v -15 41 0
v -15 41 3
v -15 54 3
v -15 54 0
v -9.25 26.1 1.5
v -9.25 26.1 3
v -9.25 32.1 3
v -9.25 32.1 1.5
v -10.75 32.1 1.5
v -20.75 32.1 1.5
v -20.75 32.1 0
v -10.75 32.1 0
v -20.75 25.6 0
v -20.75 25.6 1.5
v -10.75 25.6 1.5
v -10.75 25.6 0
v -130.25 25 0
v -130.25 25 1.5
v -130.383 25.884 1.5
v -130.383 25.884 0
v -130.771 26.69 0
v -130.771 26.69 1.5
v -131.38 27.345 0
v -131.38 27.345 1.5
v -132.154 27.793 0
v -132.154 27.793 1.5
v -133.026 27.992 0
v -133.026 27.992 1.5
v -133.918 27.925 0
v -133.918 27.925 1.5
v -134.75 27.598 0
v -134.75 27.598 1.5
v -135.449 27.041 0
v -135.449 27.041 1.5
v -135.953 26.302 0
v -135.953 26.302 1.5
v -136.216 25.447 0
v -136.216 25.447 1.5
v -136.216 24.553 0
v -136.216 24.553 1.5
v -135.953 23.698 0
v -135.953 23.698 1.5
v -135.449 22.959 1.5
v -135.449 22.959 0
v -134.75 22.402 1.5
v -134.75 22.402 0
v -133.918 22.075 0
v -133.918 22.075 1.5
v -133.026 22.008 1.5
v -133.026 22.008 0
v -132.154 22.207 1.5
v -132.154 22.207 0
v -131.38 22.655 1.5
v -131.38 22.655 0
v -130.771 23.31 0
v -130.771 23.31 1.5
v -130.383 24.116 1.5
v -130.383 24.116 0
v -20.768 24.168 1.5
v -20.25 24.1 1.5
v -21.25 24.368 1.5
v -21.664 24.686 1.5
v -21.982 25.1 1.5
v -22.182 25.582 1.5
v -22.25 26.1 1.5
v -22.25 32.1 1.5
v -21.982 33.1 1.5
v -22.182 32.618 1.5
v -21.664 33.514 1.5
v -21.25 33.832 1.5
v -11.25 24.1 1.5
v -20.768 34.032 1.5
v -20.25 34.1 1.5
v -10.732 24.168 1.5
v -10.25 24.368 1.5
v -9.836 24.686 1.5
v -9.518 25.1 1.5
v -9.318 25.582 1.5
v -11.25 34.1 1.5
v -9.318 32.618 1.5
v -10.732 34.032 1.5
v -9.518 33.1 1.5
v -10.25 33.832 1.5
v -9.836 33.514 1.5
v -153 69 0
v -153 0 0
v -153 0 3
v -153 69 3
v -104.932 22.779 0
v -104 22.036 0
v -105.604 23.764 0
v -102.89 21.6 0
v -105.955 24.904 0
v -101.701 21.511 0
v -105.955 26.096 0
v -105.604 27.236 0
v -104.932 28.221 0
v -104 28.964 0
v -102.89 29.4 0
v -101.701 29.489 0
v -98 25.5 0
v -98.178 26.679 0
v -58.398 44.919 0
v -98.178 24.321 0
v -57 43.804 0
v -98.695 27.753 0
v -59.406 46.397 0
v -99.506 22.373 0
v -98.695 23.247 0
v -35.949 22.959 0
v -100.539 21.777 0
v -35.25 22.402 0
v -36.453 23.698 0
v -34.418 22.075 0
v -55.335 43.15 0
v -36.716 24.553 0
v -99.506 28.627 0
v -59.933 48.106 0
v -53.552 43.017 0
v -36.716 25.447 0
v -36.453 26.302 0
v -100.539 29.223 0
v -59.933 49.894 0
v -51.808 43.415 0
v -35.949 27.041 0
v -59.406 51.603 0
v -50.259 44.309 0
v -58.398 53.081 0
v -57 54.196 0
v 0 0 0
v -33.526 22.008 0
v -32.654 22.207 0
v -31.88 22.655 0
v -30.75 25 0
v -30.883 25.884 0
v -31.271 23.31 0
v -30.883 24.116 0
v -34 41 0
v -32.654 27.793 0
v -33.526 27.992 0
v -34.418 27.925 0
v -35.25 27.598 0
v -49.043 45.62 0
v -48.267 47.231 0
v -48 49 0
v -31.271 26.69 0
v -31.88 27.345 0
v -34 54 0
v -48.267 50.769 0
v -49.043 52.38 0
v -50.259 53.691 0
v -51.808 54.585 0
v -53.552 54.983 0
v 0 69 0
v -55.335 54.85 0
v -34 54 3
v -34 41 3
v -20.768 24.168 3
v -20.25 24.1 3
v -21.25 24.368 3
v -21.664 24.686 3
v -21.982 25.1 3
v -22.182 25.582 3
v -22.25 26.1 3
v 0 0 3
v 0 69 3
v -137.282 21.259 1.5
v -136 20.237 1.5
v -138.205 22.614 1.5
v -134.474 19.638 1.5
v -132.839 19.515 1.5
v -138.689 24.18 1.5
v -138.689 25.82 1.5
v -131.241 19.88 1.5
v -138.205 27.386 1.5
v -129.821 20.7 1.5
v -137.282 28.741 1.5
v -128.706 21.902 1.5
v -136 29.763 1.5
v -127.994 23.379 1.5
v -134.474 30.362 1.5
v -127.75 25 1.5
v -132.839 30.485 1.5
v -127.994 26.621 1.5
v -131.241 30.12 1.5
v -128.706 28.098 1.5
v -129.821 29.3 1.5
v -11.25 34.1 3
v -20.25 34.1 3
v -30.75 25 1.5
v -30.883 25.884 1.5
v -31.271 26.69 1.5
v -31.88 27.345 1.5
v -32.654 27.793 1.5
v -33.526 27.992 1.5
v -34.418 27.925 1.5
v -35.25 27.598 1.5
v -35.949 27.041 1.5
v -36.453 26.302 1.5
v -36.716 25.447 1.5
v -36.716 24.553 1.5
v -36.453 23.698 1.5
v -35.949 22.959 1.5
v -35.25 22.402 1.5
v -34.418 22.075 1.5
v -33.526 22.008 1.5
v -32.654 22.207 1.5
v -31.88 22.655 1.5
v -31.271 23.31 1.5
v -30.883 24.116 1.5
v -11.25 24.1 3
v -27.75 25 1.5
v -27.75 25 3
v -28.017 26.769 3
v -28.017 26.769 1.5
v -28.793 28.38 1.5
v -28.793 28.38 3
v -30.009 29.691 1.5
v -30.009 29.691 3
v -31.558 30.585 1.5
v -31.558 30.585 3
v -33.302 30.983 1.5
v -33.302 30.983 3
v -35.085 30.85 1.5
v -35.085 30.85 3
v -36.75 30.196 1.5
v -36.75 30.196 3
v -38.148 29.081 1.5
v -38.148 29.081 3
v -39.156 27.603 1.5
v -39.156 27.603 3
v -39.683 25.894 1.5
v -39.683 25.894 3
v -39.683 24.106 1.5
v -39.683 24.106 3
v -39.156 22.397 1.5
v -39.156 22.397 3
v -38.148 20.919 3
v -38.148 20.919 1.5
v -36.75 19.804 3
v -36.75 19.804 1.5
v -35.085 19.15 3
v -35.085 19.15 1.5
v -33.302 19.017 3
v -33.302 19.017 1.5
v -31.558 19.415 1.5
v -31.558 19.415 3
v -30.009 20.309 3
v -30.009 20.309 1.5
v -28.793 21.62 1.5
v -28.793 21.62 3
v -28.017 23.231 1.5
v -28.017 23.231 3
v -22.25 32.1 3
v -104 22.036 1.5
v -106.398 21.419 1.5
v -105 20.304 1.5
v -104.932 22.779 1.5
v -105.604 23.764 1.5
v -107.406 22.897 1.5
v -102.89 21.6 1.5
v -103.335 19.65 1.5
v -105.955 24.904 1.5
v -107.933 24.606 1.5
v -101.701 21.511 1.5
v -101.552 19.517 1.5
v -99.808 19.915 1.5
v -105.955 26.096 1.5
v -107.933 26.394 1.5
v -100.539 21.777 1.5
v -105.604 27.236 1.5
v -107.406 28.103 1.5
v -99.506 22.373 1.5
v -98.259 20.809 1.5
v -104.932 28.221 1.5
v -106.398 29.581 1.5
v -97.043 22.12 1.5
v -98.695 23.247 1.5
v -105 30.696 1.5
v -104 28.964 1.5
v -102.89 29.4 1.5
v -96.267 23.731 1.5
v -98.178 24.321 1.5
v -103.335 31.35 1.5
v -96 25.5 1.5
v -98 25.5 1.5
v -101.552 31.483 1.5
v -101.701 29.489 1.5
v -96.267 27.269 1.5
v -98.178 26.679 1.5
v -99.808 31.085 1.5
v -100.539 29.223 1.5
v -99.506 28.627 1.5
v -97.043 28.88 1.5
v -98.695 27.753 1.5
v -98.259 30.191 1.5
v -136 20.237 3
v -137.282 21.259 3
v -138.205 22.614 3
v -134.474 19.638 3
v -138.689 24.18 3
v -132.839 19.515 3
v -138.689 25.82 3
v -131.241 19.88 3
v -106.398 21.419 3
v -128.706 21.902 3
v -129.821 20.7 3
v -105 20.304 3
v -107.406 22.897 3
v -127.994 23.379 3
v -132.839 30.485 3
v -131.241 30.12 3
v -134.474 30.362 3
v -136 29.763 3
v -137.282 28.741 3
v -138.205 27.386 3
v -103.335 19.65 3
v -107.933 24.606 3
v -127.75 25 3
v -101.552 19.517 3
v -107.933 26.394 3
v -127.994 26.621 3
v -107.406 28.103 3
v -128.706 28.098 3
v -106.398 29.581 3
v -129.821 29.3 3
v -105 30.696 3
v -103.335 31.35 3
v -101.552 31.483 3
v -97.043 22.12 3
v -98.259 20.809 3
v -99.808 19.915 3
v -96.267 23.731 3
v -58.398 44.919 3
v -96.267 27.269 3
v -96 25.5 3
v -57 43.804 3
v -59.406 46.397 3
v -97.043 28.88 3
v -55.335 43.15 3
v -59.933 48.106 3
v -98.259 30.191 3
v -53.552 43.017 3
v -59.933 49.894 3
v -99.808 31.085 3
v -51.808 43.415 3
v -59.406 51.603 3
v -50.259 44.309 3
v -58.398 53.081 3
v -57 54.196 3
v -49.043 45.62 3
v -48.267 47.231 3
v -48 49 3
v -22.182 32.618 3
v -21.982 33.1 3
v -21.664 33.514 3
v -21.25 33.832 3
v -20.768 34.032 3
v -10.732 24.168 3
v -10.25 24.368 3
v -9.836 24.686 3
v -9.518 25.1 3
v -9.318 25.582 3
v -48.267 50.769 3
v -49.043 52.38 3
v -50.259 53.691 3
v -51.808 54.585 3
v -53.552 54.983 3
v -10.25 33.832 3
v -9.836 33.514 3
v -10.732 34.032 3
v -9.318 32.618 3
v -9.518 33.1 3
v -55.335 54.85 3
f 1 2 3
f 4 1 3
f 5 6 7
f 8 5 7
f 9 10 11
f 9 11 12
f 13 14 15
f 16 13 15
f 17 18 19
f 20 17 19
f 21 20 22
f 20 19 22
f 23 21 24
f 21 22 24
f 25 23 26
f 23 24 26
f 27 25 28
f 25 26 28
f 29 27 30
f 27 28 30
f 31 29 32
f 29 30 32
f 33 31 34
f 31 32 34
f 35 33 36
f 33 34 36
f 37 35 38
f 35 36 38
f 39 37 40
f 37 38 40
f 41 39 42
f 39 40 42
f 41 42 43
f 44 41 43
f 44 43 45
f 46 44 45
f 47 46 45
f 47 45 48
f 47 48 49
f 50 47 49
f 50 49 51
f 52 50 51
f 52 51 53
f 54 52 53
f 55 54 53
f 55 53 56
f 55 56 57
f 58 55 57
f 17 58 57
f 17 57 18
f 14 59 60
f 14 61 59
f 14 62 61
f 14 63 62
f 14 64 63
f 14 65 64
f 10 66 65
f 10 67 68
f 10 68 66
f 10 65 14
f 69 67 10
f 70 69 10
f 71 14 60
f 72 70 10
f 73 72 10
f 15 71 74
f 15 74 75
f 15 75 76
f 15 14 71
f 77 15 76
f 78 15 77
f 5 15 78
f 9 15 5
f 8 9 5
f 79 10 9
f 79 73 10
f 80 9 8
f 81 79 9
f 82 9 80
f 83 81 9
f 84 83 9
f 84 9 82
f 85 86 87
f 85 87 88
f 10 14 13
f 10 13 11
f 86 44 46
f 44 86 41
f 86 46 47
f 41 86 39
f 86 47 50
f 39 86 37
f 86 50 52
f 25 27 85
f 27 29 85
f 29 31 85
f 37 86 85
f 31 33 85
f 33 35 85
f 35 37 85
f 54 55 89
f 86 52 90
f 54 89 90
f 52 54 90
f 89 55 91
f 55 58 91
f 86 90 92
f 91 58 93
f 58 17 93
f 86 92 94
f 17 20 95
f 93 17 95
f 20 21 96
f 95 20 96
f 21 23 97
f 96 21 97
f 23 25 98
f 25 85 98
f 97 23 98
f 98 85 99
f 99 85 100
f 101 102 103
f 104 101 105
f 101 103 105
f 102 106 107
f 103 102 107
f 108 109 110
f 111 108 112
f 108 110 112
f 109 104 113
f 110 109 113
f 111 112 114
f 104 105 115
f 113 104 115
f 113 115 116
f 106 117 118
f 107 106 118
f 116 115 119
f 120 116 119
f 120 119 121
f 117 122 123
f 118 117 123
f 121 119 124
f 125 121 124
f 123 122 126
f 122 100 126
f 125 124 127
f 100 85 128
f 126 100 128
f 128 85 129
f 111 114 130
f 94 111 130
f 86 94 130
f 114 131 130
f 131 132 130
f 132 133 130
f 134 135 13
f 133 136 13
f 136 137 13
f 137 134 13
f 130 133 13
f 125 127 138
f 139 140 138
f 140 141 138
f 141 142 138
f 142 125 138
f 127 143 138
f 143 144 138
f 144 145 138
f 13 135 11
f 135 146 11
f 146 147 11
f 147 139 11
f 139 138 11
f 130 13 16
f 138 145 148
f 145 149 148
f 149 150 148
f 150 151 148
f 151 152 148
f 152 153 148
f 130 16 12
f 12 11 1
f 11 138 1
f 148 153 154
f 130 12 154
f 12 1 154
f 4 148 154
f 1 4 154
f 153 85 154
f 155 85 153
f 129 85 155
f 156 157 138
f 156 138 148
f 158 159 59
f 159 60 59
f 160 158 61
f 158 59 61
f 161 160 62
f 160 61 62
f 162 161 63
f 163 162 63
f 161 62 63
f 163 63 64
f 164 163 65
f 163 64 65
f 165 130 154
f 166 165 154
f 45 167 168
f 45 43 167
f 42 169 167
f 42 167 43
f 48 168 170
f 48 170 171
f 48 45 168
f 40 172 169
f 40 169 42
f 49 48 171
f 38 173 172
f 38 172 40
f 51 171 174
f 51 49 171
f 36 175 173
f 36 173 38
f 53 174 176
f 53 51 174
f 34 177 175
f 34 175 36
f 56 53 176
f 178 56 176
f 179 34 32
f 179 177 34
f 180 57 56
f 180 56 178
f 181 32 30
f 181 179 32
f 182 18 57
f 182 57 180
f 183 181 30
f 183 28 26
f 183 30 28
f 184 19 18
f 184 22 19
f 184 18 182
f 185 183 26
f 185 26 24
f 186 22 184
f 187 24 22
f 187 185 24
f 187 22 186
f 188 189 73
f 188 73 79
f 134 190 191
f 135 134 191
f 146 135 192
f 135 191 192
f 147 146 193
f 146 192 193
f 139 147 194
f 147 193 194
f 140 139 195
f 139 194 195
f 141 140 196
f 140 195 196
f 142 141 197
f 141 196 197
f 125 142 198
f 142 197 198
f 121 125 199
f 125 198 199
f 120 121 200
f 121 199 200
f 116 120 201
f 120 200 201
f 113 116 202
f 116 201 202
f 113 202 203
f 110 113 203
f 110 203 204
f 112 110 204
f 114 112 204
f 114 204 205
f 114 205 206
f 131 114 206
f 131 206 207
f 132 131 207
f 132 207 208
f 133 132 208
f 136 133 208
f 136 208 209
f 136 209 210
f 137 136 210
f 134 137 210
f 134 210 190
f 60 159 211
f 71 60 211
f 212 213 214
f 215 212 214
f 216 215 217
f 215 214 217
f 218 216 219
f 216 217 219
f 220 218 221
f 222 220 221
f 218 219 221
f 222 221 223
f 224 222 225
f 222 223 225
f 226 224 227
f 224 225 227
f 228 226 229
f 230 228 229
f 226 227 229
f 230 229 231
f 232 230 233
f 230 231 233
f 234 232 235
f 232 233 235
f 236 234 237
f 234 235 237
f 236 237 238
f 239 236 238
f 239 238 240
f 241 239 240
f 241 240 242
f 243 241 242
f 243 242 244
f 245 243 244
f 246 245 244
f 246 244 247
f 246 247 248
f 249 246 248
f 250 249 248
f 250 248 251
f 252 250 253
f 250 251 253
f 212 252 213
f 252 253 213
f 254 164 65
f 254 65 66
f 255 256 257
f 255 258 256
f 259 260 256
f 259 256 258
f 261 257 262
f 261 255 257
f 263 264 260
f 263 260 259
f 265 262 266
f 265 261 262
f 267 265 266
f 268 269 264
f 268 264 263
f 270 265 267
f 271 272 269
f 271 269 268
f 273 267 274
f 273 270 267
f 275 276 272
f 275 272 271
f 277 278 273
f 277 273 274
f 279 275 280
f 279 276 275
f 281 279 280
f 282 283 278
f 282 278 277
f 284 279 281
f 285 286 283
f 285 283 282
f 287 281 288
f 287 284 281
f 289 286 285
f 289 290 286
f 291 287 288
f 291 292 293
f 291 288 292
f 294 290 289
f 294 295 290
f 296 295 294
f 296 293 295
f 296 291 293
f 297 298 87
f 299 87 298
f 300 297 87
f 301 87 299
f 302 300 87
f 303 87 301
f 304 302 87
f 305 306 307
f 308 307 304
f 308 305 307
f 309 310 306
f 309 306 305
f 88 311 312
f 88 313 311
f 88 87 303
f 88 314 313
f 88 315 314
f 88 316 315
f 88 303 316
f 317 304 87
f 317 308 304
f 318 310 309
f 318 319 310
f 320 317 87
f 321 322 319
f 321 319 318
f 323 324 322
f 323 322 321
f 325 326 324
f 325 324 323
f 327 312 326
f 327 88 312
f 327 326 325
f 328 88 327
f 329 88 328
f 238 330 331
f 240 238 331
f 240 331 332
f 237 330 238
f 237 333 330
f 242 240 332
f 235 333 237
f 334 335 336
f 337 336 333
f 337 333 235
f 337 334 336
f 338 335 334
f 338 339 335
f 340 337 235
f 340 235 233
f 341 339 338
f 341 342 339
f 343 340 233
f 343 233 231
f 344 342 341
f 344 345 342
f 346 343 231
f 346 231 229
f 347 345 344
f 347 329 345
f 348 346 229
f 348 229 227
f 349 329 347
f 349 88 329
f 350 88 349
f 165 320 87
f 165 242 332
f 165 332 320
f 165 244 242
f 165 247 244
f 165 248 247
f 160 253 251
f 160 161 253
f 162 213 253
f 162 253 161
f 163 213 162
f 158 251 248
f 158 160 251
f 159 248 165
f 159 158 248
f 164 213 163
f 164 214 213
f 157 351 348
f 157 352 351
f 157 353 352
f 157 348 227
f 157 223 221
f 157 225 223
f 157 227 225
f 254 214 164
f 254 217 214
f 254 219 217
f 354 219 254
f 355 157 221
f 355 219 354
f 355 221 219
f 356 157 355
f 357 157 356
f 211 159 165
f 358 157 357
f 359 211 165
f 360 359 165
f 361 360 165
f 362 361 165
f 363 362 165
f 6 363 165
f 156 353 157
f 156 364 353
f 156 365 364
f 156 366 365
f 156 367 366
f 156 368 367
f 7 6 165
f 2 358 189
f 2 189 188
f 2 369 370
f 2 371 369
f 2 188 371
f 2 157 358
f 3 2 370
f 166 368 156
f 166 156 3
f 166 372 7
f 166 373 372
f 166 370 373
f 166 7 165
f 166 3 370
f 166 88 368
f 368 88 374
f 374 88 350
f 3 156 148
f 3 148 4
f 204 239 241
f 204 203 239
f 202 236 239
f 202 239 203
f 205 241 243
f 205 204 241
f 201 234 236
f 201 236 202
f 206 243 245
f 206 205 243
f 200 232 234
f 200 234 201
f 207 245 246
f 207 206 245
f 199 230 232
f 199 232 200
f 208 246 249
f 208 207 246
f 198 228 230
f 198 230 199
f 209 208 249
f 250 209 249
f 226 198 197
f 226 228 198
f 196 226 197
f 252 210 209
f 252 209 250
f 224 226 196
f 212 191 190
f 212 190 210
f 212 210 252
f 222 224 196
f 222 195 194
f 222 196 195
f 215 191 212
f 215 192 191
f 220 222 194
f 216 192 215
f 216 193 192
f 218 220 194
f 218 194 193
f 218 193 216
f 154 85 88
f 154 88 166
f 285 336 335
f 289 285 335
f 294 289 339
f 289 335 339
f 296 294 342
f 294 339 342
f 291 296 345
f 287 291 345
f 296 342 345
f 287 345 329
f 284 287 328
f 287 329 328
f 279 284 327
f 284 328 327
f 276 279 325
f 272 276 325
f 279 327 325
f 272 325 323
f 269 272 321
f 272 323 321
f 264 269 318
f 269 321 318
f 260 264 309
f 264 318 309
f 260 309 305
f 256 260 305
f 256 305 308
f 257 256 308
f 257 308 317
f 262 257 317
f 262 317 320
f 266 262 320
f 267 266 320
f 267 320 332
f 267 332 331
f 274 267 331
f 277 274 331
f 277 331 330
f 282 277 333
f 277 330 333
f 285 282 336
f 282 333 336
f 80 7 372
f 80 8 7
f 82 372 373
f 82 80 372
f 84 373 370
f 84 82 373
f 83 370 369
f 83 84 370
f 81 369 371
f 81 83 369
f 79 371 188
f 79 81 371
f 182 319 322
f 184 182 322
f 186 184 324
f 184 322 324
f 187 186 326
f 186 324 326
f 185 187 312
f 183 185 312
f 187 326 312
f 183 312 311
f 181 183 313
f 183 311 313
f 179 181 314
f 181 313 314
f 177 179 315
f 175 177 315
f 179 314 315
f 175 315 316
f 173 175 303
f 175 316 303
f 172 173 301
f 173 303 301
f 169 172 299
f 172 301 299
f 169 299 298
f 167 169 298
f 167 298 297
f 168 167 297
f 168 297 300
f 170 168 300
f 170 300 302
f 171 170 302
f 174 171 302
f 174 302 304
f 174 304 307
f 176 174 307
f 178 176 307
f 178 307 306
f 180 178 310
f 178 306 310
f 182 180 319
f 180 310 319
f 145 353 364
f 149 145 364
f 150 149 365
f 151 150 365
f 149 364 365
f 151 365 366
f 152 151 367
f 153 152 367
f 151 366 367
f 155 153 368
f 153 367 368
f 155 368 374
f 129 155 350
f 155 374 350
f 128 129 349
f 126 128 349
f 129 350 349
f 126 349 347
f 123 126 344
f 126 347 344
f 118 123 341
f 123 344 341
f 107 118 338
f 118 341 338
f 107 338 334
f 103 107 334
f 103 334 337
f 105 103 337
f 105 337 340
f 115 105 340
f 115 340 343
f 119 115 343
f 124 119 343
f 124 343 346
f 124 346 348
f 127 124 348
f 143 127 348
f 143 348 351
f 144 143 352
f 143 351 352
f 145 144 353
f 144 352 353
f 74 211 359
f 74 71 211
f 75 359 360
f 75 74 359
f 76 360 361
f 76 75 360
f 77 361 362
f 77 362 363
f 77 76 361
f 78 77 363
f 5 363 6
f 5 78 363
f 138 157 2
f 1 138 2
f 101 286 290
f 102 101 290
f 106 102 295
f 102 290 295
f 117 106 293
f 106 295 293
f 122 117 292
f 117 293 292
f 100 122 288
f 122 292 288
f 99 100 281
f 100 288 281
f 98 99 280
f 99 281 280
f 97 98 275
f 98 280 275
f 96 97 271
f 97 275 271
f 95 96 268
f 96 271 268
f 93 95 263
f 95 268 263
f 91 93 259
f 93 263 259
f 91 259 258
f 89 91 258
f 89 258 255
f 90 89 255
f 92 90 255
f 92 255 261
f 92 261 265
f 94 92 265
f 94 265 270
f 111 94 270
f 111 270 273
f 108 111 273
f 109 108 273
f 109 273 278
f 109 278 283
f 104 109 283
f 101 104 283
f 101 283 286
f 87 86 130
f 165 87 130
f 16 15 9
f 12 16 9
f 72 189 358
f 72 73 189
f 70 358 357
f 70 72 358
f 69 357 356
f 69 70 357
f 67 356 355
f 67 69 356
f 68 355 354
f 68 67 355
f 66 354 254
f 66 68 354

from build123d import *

# Parameters (mm, degrees)
IZIM1_W                     = 153
IZIM1_H                     = 69
Y_KSEKLIK_EKSTR_ZYON1_DEPTH = 3
IZIM2_R                     = 3
IZIM2_R_2                   = 4
IZIM2_R_3                   = 6
IZIM2_W                     = 19
IZIM2_H                     = 13
KES_EKSTR_ZYON1_DEPTH       = 3
IZIM4_R                     = 5.5
IZIM4_R_2                   = 6
KES_EKSTR_ZYON2_DEPTH       = 1.5
IZIM5_W                     = 13
IZIM5_H                     = 10
KES_EKSTR_ZYON4_DEPTH       = 1.5
IZIM7_W                     = 10
IZIM7_H                     = 6.5
KES_EKSTR_ZYON5_DEPTH       = 1.5
RADYUS1_R                   = 2


with BuildPart() as part:
    # Çizim1 → Yükseklik-Ekstrüzyon1 (new body)
    with BuildSketch(Plane.XY):
        with Locations((-76.5, 34.5)):
            Rectangle(IZIM1_W, IZIM1_H)
    extrude(amount=Y_KSEKLIK_EKSTR_ZYON1_DEPTH)

    # Çizim2 → Kes-Ekstrüzyon1 (cut)
    with BuildSketch(Plane.XY.offset(3)):
        with Locations((-133.25, 25)):
            Circle(IZIM2_R)
        with Locations((-102, 25.5)):
            Circle(IZIM2_R_2)
        with Locations((-33.75, 25)):
            Circle(IZIM2_R)
        with Locations((-54, 49)):
            Circle(IZIM2_R_3)
        with Locations((-24.5, 47.5)):
            Rectangle(IZIM2_W, IZIM2_H)
    extrude(amount=-KES_EKSTR_ZYON1_DEPTH, mode=Mode.SUBTRACT)

    # Çizim4 → Kes-Ekstrüzyon2 (cut)
    with BuildSketch(Plane.XY.offset(3)):
        with Locations((-133.25, 25)):
            Circle(IZIM4_R)
        with Locations((-102, 25.5)):
            Circle(IZIM4_R_2)
        with Locations((-33.75, 25)):
            Circle(IZIM4_R_2)
    extrude(amount=-KES_EKSTR_ZYON2_DEPTH, mode=Mode.SUBTRACT)

    # Çizim5 → Kes-Ekstrüzyon4 (cut)
    with BuildSketch(Plane.XY.offset(3)):
        with Locations((-15.75, 29.1)):
            Rectangle(IZIM5_W, IZIM5_H)
    extrude(amount=-KES_EKSTR_ZYON4_DEPTH, mode=Mode.SUBTRACT)

    # Çizim7 → Kes-Ekstrüzyon5 (cut)
    with BuildSketch(Plane.XY.offset(1.5)):
        with Locations((-15.75, 28.85)):
            Rectangle(IZIM7_W, IZIM7_H)
    extrude(amount=-KES_EKSTR_ZYON5_DEPTH, mode=Mode.SUBTRACT)

    # Radyus1
    radyus1_edges = [part.edges().sort_by_distance(p)[0] for p in [
        (-22.25, 24.1, 2.25),
        (-22.25, 34.1, 2.25),
        (-9.25, 34.1, 2.25),
        (-9.25, 24.1, 2.25),
    ]]
    fillet(radyus1_edges, radius=RADYUS1_R)


solid = part.part
